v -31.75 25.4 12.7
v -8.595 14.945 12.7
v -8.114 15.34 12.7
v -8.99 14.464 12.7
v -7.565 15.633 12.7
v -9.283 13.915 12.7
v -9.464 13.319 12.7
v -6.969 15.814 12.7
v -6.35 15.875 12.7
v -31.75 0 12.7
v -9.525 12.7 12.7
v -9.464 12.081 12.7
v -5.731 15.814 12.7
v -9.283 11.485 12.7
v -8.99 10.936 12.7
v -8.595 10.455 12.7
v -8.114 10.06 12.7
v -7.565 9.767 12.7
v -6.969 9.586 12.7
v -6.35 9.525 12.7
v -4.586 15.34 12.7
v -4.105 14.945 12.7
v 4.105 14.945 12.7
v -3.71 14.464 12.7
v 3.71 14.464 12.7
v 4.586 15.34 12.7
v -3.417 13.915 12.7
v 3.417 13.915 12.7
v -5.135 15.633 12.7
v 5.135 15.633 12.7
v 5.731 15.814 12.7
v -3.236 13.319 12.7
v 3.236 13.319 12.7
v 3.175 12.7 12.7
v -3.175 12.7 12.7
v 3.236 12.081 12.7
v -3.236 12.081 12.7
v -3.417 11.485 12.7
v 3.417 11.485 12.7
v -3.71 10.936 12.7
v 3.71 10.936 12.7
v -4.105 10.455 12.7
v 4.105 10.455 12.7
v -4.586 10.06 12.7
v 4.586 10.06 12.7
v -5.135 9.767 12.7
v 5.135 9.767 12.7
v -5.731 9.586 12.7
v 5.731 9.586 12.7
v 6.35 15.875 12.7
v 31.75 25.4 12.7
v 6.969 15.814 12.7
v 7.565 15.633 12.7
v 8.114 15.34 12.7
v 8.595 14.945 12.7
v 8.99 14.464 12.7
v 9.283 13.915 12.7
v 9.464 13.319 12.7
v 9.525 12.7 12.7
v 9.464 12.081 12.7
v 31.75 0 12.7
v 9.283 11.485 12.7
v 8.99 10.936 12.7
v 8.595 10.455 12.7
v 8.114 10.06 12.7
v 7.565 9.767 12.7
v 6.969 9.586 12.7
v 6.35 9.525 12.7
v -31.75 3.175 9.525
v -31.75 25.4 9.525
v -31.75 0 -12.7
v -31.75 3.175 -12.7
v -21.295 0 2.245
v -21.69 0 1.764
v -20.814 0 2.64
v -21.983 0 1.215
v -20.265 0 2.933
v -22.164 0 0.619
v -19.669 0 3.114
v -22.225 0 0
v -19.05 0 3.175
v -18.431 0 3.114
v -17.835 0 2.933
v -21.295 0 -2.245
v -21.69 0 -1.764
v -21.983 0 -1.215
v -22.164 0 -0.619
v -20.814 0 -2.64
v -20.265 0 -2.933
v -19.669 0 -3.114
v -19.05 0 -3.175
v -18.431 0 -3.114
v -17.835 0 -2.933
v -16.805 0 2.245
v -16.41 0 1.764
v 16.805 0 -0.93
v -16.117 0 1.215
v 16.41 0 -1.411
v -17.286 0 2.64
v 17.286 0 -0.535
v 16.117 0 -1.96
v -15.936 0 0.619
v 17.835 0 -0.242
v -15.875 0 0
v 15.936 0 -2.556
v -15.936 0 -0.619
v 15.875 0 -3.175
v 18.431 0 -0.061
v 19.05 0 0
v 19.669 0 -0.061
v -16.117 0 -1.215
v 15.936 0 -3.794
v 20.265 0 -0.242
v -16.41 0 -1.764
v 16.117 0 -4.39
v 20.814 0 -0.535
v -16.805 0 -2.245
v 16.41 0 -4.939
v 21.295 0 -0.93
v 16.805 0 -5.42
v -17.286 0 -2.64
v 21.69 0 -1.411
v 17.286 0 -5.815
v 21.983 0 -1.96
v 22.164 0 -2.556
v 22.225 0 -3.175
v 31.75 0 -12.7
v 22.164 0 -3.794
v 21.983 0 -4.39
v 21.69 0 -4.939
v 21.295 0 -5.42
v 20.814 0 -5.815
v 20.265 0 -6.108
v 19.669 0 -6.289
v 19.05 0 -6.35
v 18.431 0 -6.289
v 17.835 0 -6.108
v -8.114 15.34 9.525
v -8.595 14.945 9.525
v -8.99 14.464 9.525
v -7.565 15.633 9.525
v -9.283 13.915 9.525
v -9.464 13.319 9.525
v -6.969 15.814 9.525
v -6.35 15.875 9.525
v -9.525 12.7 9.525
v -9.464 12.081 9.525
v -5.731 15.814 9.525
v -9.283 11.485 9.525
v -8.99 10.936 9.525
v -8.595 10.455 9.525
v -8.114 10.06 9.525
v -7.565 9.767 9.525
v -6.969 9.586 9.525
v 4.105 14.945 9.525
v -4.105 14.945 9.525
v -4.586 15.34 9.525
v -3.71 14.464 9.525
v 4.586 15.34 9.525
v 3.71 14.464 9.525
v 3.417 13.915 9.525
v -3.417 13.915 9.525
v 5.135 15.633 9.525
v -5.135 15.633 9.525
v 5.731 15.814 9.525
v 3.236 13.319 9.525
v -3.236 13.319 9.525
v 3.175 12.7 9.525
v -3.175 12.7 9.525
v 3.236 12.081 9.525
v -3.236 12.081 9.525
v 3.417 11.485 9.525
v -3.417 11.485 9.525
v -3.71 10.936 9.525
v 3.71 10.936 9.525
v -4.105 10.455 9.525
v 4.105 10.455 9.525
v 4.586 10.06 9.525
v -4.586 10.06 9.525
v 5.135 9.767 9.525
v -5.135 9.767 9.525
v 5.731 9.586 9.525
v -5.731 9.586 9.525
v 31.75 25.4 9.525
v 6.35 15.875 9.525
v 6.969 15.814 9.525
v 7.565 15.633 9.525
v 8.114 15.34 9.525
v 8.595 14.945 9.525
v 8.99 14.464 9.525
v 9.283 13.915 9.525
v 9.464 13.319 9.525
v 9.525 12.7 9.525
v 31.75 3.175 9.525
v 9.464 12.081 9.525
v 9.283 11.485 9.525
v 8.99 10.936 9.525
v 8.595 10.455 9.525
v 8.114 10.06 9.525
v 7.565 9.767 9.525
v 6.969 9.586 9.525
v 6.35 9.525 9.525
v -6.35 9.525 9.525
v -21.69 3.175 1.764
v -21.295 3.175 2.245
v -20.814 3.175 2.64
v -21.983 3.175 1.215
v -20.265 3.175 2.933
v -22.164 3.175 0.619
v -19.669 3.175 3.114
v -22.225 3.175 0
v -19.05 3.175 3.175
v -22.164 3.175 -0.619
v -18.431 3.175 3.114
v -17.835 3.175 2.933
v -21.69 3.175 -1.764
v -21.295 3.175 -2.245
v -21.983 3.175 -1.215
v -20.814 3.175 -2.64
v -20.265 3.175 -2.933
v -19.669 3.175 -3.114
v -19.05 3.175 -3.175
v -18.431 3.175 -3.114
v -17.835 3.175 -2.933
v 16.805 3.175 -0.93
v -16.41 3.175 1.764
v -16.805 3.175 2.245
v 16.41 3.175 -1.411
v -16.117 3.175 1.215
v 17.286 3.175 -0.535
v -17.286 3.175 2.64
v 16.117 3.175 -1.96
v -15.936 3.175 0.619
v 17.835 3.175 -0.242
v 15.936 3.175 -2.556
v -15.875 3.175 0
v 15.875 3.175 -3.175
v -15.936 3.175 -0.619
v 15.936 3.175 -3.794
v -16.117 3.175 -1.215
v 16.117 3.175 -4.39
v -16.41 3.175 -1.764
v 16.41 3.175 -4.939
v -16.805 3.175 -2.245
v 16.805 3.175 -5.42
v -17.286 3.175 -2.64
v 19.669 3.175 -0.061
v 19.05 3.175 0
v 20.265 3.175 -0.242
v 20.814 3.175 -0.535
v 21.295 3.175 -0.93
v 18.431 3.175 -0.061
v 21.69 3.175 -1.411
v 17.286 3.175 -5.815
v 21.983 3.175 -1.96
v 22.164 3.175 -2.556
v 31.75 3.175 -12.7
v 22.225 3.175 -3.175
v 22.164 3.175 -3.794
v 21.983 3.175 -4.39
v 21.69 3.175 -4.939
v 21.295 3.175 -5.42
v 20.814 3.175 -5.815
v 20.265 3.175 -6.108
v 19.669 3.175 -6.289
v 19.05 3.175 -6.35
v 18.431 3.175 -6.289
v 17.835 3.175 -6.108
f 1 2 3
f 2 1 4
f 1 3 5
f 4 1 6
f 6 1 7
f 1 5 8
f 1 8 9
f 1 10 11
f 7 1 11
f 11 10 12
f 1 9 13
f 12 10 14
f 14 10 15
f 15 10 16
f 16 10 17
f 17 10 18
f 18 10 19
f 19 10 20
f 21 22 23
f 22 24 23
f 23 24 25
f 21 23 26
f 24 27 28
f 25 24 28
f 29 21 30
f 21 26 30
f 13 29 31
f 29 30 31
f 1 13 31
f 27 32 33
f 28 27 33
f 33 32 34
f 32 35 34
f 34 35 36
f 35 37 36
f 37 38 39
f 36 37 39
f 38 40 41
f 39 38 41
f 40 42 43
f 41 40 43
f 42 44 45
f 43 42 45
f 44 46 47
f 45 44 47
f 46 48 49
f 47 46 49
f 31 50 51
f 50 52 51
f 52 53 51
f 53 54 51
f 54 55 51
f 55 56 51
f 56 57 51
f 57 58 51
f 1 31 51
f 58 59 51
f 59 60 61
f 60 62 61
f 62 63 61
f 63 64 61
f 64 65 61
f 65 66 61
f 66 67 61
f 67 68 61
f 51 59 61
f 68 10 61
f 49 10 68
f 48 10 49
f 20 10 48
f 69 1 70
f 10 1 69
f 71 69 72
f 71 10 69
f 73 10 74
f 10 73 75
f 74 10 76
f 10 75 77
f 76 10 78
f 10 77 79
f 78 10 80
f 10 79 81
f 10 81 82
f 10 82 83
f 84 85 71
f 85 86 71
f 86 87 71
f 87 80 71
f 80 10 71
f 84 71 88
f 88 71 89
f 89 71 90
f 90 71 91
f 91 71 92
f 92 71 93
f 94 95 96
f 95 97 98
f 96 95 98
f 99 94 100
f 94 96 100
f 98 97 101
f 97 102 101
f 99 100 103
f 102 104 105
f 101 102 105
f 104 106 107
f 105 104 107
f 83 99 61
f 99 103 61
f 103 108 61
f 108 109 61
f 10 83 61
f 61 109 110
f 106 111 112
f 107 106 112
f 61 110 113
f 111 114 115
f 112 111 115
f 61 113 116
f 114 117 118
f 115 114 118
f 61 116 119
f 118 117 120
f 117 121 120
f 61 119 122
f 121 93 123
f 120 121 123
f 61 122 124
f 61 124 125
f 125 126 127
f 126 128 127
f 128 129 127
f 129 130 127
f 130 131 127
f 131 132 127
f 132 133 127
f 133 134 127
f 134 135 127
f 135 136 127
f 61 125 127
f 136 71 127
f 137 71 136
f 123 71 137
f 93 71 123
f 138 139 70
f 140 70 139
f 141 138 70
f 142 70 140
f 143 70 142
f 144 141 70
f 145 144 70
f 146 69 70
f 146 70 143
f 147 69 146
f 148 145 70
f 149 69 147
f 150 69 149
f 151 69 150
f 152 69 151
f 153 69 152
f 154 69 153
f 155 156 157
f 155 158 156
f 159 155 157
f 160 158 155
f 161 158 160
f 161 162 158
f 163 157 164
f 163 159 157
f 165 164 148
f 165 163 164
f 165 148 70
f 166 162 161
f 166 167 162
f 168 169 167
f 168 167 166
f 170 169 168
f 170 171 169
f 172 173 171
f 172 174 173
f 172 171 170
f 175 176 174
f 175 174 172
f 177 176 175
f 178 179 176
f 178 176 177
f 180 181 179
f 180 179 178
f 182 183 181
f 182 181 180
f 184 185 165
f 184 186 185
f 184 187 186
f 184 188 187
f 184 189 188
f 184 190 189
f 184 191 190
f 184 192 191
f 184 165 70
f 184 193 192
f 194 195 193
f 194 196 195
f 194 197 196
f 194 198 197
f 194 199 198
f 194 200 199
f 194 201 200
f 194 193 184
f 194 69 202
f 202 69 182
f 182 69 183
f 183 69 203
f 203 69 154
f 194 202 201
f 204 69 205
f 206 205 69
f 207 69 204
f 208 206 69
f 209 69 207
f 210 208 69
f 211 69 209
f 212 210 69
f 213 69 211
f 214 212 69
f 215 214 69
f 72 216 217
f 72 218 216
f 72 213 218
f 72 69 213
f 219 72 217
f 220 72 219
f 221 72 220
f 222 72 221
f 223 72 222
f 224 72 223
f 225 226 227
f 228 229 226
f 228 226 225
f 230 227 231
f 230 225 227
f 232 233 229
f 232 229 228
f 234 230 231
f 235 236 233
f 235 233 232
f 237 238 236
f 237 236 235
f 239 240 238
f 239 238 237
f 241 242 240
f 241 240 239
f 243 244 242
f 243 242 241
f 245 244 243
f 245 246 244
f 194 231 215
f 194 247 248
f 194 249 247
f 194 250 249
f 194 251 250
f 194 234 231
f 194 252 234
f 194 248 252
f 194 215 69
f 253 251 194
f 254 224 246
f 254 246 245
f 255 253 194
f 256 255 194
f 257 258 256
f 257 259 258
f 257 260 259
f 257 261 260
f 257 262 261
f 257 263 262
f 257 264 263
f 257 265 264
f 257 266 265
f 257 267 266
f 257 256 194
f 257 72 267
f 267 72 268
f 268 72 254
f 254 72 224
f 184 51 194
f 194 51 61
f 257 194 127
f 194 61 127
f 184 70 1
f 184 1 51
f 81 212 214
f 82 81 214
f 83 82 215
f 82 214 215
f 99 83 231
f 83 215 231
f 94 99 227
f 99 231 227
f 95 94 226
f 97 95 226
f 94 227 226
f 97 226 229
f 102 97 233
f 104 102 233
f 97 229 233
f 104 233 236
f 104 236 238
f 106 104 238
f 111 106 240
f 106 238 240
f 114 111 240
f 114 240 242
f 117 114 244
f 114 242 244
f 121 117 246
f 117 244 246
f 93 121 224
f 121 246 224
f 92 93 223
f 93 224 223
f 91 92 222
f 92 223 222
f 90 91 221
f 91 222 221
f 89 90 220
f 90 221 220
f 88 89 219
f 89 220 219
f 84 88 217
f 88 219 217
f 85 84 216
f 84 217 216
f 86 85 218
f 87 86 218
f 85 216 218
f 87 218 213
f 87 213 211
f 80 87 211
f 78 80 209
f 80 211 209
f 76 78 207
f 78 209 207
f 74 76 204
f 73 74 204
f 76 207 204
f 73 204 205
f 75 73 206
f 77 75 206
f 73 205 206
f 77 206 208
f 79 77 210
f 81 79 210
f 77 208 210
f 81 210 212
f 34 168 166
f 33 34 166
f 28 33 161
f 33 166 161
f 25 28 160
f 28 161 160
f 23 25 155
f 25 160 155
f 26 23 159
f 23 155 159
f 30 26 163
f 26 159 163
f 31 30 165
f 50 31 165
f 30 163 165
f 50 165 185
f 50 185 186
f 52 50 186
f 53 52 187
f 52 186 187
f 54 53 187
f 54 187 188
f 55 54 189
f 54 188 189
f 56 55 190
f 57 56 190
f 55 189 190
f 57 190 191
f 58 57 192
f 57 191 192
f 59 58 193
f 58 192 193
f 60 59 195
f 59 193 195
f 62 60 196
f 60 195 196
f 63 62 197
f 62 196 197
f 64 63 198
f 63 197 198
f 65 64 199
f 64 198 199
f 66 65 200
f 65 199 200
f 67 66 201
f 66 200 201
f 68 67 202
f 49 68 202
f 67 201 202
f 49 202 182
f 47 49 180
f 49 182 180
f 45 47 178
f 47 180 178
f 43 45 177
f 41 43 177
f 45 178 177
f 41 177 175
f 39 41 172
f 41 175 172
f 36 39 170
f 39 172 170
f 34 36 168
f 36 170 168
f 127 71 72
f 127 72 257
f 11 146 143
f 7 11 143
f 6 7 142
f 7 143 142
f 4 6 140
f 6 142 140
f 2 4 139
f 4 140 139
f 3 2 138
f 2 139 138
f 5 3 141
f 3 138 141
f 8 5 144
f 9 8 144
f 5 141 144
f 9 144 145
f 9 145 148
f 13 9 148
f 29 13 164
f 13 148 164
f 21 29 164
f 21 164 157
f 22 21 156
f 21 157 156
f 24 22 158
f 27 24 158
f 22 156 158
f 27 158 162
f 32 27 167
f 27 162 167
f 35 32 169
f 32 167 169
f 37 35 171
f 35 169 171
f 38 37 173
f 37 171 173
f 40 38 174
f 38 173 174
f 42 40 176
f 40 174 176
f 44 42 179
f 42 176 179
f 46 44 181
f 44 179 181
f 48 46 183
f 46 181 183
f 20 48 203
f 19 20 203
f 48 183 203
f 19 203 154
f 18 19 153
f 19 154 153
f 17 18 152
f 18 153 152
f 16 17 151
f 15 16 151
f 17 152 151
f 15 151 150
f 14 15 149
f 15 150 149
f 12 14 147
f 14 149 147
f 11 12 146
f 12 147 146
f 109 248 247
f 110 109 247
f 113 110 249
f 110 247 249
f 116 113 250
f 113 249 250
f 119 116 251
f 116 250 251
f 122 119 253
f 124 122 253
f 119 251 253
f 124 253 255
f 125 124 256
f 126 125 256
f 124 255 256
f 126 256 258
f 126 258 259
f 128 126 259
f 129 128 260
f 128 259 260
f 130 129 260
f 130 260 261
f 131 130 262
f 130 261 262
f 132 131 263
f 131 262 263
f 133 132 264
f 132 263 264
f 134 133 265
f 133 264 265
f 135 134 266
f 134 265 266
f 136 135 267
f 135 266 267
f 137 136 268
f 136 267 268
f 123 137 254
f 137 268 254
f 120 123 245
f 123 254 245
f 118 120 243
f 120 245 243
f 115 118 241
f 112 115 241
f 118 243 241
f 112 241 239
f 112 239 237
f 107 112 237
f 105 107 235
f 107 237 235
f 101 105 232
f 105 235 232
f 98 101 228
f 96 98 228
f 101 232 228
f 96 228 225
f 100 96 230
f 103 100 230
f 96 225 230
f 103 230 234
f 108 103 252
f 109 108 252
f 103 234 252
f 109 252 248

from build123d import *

# Parameters (mm, degrees)
SKETCH1_W           = 63.5
SKETCH1_H           = 25.4
BOSS_EXTRUDE1_DEPTH = 3.175
SKETCH2_W           = 63.5
SKETCH2_H           = 3.175
BOSS_EXTRUDE2_DEPTH = 22.225
SKETCH3_R           = 3.175
CUT_EXTRUDE1_DEPTH  = 3.175
SKETCH4_R           = 3.175
CUT_EXTRUDE2_DEPTH  = 3.175


with BuildPart() as part:
    # Sketch1 → Boss-Extrude1 (new body)
    with BuildSketch(Plane(origin=(0, 0, 0), x_dir=(1, 0, 0), z_dir=(0, 1, 0))):
        Rectangle(SKETCH1_W, SKETCH1_H)
    extrude(amount=BOSS_EXTRUDE1_DEPTH)

    # Sketch2 → Boss-Extrude2 (add)
    with BuildSketch(Plane(origin=(0, 3.175, 0), x_dir=(1, 0, 0), z_dir=(0, 1, 0))):
        with Locations((0, -11.1125)):
            Rectangle(SKETCH2_W, SKETCH2_H)
    extrude(amount=BOSS_EXTRUDE2_DEPTH)

    # Sketch3 → Cut-Extrude1 (cut)
    with BuildSketch(Plane(origin=(0, 0, 9.525), x_dir=(-1, 0, 0), z_dir=(0, 0, -1))):
        with Locations((6.35, 12.7)):
            Circle(SKETCH3_R)
        with Locations((-6.35, 12.7)):
            Circle(SKETCH3_R)
    extrude(amount=-CUT_EXTRUDE1_DEPTH, mode=Mode.SUBTRACT)

    # Sketch4 → Cut-Extrude2 (cut)
    with BuildSketch(Plane(origin=(0, 3.175, 0), x_dir=(1, 0, 0), z_dir=(0, 1, 0))):
        with Locations(Location((-19.05, 0, 0), (0, 0, 270))):
            Circle(SKETCH4_R)
        with Locations(Location((19.05, 3.175, 0), (0, 0, 270))):
            Circle(SKETCH4_R)
    extrude(amount=-CUT_EXTRUDE2_DEPTH, mode=Mode.SUBTRACT)


solid = part.part
